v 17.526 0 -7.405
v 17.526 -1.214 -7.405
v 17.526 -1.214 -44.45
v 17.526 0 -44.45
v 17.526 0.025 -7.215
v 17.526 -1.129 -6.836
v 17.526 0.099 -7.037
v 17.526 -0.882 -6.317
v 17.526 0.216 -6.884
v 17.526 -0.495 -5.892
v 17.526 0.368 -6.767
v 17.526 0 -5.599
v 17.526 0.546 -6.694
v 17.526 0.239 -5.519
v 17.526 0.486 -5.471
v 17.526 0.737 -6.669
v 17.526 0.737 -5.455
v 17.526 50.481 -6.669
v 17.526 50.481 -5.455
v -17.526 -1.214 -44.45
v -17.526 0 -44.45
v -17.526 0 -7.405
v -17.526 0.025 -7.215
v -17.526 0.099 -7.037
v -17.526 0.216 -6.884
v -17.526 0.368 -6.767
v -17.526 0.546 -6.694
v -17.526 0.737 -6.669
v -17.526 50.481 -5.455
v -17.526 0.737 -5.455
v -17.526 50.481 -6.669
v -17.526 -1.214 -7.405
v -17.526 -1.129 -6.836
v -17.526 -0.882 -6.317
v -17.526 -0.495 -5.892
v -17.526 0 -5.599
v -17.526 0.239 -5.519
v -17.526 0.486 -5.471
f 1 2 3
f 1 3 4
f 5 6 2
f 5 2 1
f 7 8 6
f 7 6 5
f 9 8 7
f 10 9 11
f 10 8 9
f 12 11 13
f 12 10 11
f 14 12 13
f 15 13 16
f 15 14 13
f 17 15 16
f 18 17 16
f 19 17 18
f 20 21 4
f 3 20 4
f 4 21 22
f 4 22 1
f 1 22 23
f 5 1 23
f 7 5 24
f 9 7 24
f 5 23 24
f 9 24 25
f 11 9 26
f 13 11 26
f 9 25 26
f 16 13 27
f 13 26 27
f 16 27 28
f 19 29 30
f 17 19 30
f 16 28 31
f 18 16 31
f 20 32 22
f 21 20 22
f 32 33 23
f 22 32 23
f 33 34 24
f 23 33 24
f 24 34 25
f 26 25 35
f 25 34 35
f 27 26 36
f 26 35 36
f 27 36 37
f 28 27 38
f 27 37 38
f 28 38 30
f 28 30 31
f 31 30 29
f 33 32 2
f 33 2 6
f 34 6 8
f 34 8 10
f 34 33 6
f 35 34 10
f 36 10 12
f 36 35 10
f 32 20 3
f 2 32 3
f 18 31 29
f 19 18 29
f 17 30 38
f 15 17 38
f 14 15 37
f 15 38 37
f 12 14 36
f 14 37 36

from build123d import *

# Parameters (mm, degrees)
SKETCH1_W              = 35.052
SKETCH1_H              = 88.9
BASE_FLANGE1_DEPTH     = 1.21412
SKETCHED_START         = -17.526
SKETCHED_BEND1_DEPTH   = 35.052
SKETCHED_BEND1_2_DEPTH = 35.052


# Read off the part's stored shape, not the designer's step: Sketched Bend1
# Sheet-metal steps are written as plain solids
with BuildPart() as part:
    # Sketch1 → Base-Flange1 (new body)
    with BuildSketch(Plane(origin=(0, 0, 0), x_dir=(1, 0, 0), z_dir=(0, 1, 0))):
        Rectangle(SKETCH1_W, SKETCH1_H)
    extrude(amount=-BASE_FLANGE1_DEPTH)

    # Sketched Bend1 outline → Sketched Bend1 (cut)
    with BuildSketch(Plane.YZ.offset(SKETCHED_START)):
        with BuildLine():
            ThreePointArc((-1.21412, -7.405308096), (-0.882382531, -6.317096681), (0, -5.599005531))
            Line((0, -5.599005531), (0, 44.45))
            Line((0, 44.45), (-1.21412, 44.45))
            Line((-1.21412, 44.45), (-1.21412, -7.405308096))
        make_face()
    extrude(amount=SKETCHED_BEND1_DEPTH, mode=Mode.SUBTRACT)

    # Sketched Bend1 2 outline → Sketched Bend1 2 (add)
    with BuildSketch(Plane.YZ.offset(SKETCHED_START)):
        with BuildLine():
            Line((50.481291904, -6.668708096), (50.481291904, -5.454588096))
            Line((50.481291904, -5.454588096), (0.7366, -5.454588096))
            ThreePointArc((0.7366, -5.454588096), (0.361288145, -5.491032899), (0, -5.599005531))
            Line((0, -5.599005531), (0, -7.405308096))
            ThreePointArc((0, -7.405308096), (0.215745145, -6.884453241), (0.7366, -6.668708096))
            Line((0.7366, -6.668708096), (50.481291904, -6.668708096))
        make_face()
    extrude(amount=SKETCHED_BEND1_2_DEPTH)


solid = part.part
